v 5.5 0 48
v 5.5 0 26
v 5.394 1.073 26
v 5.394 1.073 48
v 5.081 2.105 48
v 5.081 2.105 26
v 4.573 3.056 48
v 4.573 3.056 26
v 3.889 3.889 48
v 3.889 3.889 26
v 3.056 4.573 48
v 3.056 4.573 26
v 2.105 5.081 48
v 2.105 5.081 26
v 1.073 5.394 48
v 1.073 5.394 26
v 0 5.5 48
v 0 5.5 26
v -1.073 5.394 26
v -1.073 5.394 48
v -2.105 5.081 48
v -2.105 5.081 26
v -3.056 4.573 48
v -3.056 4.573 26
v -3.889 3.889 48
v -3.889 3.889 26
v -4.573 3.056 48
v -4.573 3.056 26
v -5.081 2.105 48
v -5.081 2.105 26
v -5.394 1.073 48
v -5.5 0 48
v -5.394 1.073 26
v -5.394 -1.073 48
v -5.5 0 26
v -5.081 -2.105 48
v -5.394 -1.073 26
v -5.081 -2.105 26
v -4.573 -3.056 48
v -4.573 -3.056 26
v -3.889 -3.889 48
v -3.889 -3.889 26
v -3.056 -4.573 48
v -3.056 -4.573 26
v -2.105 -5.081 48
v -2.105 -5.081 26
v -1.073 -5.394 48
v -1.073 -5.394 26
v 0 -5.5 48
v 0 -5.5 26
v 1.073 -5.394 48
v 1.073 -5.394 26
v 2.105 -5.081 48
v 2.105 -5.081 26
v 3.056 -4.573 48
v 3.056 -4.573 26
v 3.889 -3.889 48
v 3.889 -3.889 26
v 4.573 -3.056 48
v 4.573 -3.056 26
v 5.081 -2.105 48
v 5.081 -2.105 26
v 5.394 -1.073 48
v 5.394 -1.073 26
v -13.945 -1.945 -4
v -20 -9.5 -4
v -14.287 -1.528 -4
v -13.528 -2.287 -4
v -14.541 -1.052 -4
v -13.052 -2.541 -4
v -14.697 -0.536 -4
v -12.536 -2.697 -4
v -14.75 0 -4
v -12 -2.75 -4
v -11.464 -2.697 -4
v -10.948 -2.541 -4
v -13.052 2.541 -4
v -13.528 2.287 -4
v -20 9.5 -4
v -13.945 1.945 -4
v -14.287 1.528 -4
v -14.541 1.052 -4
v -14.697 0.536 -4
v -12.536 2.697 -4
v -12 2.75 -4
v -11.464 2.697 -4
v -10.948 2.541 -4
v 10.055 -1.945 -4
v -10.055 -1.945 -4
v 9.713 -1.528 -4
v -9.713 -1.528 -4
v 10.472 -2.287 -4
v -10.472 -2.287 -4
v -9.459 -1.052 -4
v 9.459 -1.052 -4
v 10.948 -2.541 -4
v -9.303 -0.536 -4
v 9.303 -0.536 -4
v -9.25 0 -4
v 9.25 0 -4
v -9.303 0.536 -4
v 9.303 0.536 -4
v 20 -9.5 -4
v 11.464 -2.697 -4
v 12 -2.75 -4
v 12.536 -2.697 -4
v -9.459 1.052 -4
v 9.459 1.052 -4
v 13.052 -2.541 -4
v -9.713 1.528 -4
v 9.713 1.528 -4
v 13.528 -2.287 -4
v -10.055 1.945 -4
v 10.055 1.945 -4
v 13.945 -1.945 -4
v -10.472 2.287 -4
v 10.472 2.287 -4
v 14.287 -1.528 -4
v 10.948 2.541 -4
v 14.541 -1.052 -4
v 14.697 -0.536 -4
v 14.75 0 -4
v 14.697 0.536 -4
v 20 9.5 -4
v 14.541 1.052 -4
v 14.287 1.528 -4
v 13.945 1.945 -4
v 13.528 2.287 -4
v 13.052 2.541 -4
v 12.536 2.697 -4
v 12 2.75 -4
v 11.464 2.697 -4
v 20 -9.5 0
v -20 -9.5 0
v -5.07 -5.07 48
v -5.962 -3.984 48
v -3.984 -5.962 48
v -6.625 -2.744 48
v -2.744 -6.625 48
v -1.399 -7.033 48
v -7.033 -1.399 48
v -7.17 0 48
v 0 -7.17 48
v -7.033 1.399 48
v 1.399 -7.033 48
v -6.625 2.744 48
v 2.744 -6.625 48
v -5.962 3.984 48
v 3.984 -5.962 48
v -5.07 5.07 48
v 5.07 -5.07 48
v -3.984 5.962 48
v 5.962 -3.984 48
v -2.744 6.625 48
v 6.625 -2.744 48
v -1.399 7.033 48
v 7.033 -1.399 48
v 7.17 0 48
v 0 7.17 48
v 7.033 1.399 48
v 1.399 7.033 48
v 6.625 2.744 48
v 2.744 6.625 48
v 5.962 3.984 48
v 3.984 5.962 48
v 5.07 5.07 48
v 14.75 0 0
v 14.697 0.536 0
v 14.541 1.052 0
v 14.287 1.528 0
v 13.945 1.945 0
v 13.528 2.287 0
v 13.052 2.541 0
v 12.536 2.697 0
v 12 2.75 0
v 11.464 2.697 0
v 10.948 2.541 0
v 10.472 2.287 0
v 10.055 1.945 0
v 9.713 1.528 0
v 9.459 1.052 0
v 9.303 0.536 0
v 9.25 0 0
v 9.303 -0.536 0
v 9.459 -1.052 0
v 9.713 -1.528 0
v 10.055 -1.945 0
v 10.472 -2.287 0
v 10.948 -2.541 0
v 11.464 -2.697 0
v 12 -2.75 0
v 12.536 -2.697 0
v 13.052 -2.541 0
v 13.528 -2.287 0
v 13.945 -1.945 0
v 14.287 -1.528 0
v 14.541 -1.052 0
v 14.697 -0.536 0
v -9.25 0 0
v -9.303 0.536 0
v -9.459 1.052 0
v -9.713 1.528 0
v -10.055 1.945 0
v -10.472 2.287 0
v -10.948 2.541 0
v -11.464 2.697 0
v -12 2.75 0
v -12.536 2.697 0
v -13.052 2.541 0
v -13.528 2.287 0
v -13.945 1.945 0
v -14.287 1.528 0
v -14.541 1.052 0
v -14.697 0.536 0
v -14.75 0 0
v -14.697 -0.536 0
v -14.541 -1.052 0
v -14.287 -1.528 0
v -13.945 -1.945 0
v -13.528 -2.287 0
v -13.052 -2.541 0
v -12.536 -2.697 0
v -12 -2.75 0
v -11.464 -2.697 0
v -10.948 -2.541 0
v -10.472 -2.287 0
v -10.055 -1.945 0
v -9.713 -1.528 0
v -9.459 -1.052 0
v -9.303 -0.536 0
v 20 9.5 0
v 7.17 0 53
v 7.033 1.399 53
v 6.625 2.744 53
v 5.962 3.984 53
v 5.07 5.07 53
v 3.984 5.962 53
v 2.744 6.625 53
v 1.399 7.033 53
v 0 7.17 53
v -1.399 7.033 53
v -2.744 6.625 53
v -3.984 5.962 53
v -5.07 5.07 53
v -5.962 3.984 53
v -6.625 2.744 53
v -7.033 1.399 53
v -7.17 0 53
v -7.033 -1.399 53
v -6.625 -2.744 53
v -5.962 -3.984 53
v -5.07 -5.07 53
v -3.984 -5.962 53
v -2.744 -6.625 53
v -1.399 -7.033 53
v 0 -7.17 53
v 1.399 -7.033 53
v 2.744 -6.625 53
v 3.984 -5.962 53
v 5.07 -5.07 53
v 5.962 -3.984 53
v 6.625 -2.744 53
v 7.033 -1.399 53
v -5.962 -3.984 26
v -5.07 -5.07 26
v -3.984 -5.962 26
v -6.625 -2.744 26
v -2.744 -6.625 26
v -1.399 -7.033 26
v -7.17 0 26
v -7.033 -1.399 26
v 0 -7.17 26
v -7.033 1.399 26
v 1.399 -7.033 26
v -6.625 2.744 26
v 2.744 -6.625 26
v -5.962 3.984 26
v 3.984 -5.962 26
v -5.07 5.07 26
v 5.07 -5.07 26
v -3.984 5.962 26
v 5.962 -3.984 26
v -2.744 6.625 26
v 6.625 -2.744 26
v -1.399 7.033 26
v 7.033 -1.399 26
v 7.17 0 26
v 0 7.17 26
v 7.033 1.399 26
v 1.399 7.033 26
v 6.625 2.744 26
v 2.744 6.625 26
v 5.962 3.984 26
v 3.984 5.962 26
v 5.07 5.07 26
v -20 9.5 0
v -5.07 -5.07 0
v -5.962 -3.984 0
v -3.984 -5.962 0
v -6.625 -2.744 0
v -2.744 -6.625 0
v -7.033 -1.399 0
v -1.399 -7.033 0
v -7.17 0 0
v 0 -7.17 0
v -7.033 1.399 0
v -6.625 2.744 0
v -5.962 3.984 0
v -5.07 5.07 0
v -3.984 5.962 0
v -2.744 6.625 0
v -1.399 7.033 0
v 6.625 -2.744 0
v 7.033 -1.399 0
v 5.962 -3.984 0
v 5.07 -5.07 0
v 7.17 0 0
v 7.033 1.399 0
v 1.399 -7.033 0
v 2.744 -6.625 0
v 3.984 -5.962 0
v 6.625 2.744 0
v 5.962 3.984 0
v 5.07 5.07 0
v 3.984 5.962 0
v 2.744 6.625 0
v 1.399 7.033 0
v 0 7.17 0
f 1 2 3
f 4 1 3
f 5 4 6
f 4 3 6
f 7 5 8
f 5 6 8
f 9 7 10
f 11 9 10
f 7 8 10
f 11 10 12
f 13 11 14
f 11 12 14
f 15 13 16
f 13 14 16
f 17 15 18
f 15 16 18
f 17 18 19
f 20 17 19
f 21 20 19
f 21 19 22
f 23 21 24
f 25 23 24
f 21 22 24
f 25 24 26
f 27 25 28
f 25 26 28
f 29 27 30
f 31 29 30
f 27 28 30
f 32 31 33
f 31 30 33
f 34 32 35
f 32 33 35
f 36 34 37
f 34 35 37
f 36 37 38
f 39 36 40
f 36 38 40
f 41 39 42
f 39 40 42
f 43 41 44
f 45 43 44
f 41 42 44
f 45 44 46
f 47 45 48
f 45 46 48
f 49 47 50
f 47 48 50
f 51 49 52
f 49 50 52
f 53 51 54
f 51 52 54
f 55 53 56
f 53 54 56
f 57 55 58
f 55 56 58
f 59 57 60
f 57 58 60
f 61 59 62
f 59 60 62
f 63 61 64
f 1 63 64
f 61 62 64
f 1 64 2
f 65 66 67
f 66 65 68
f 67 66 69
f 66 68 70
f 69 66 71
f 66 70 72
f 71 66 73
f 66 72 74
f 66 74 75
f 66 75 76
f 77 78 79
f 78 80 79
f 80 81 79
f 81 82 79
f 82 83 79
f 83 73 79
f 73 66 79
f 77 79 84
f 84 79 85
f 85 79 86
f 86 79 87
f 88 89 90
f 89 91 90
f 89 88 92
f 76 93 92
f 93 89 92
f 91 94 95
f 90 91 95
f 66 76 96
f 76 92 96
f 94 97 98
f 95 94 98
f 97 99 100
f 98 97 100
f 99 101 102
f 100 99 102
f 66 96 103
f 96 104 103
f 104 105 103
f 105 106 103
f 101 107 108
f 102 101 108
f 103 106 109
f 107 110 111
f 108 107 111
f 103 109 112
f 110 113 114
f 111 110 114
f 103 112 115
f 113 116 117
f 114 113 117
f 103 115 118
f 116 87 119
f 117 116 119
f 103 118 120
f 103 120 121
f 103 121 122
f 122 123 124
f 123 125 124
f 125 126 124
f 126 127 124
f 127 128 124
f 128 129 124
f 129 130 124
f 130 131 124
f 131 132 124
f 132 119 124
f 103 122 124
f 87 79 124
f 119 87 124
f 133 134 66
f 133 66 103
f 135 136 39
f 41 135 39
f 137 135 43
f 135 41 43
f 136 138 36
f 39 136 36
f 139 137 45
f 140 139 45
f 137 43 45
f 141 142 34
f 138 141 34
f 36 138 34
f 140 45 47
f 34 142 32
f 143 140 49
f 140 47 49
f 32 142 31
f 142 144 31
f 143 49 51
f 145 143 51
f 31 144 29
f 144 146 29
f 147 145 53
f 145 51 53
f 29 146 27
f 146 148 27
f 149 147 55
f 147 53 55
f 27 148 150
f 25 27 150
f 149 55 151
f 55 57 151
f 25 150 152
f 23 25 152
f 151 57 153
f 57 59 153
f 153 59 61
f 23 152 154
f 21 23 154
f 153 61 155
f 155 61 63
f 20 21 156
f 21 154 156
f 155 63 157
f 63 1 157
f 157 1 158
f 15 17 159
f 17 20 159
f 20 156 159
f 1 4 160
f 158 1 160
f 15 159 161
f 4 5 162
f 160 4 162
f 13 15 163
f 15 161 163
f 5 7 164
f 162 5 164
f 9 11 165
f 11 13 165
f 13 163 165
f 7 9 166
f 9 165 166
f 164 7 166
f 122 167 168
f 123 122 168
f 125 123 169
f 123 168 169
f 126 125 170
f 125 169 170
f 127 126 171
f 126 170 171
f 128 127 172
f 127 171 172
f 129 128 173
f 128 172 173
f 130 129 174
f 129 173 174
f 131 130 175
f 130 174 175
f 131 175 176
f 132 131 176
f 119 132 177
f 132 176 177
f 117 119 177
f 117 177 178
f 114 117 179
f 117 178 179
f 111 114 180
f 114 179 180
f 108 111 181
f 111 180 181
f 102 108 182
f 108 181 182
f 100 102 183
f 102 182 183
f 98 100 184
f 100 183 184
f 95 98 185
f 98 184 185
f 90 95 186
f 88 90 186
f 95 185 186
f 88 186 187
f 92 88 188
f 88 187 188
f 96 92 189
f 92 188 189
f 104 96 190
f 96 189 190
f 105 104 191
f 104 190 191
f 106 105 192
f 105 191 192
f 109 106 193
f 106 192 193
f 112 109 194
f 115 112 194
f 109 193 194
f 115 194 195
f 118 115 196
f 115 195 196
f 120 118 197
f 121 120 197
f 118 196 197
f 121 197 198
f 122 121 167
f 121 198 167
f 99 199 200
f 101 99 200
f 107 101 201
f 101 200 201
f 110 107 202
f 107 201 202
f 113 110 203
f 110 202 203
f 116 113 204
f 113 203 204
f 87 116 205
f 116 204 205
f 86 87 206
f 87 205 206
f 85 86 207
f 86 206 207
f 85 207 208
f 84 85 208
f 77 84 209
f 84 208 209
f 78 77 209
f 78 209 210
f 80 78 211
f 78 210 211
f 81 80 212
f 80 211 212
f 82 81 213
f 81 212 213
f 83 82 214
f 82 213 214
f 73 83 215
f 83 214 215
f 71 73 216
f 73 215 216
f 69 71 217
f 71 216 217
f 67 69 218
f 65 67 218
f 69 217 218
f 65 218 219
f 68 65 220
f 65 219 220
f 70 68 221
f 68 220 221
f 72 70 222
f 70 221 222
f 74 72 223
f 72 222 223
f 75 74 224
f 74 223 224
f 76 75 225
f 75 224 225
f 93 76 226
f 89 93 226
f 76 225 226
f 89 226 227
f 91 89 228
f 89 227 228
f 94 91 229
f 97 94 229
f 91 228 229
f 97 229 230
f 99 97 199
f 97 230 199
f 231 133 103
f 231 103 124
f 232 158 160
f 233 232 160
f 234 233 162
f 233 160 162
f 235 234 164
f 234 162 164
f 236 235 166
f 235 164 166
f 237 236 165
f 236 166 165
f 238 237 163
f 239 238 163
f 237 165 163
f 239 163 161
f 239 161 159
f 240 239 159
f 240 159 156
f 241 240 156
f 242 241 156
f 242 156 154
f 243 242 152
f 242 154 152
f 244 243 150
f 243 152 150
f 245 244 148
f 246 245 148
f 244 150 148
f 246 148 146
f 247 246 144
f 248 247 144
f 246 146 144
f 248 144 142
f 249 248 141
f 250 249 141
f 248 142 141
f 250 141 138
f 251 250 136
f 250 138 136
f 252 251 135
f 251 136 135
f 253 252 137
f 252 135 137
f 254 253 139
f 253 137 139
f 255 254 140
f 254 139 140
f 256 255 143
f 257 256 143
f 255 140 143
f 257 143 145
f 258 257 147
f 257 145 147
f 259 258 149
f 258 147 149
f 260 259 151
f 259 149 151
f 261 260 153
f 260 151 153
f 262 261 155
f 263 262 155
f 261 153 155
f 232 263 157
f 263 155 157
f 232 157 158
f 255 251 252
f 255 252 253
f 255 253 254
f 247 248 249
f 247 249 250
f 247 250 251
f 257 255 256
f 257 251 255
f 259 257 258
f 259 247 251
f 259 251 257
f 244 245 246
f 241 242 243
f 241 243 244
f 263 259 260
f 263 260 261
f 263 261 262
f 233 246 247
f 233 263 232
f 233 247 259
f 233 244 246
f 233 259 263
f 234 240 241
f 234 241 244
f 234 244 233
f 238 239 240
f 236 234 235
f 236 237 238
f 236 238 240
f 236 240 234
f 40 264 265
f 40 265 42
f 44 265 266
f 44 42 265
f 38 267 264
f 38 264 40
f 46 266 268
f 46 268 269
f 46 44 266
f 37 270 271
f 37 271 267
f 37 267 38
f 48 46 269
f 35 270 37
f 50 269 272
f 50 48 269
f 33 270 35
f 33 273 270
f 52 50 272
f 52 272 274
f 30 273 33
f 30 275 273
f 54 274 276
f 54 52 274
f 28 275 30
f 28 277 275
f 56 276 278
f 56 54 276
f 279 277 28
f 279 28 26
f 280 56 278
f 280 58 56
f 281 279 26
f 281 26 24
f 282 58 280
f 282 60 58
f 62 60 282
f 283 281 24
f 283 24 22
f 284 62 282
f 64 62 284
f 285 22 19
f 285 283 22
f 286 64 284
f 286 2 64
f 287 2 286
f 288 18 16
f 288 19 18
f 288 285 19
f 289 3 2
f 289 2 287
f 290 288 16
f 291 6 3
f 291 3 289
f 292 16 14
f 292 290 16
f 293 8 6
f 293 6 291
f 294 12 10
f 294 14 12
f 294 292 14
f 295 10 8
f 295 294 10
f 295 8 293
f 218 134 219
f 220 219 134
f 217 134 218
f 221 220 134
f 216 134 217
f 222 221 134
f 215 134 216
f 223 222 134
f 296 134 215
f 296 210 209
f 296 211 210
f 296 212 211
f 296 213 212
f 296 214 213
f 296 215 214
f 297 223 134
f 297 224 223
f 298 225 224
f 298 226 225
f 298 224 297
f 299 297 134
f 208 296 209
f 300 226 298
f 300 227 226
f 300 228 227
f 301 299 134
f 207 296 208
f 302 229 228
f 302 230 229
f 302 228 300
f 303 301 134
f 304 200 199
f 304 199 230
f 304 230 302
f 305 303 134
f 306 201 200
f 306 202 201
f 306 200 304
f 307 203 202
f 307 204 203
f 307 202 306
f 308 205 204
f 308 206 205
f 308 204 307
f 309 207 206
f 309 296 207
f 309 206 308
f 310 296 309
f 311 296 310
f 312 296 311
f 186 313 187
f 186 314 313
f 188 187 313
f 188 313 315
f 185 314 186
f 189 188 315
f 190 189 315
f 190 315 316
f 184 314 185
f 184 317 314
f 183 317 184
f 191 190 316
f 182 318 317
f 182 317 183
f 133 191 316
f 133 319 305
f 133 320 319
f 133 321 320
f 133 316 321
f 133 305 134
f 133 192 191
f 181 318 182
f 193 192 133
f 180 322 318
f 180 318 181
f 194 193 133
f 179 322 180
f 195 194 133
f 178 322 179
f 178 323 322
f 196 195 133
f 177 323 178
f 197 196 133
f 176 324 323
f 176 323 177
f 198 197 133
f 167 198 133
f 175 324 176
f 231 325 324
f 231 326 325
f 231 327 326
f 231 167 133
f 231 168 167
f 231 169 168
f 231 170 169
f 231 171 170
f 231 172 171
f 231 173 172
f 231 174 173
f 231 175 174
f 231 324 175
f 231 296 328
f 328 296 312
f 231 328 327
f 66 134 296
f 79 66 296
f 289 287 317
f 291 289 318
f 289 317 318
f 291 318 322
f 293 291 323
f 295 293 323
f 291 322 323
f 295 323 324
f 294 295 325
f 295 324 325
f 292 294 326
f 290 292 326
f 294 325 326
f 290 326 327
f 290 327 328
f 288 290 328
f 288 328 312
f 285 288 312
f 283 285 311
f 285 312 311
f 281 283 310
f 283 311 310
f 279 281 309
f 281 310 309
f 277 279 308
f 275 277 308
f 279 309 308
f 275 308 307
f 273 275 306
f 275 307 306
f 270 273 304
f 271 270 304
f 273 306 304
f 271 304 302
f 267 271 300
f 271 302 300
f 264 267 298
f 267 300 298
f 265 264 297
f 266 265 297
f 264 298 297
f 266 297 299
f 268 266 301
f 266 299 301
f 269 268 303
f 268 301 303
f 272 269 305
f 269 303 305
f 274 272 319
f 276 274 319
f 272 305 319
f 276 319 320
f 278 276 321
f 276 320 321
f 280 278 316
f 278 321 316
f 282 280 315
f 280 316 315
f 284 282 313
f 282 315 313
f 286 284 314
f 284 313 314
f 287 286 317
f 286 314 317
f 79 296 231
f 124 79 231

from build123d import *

# Parameters (mm, degrees)
SKETCH1_W           = 40
SKETCH1_H           = 19
SKETCH1_R           = 2.75
BOSS_EXTRUDE1_DEPTH = 4
SKETCH2_R           = 7.1705
BOSS_EXTRUDE2_DEPTH = 26
SKETCH3_R           = 5.5
BOSS_EXTRUDE3_DEPTH = 22
SKETCH4_R           = 7.1705
BOSS_EXTRUDE4_DEPTH = 5


with BuildPart() as part:
    # Sketch1 → Boss-Extrude1 (new body)
    with BuildSketch(Plane.XY):
        Rectangle(SKETCH1_W, SKETCH1_H)
        with Locations((12, 0)):
            Circle(SKETCH1_R, mode=Mode.SUBTRACT)
        with Locations((-12, 0)):
            Circle(SKETCH1_R, mode=Mode.SUBTRACT)
    extrude(amount=-BOSS_EXTRUDE1_DEPTH)

    # Sketch2 → Boss-Extrude2 (add)
    with BuildSketch(Plane.XY):
        Circle(SKETCH2_R)
    extrude(amount=BOSS_EXTRUDE2_DEPTH)

    # Sketch3 → Boss-Extrude3 (add)
    with BuildSketch(Plane.XY.offset(26)):
        Circle(SKETCH3_R)
    extrude(amount=BOSS_EXTRUDE3_DEPTH)

    # Sketch4 → Boss-Extrude4 (add)
    with BuildSketch(Plane.XY.offset(48)):
        Circle(SKETCH4_R)
    extrude(amount=BOSS_EXTRUDE4_DEPTH)


solid = part.part
